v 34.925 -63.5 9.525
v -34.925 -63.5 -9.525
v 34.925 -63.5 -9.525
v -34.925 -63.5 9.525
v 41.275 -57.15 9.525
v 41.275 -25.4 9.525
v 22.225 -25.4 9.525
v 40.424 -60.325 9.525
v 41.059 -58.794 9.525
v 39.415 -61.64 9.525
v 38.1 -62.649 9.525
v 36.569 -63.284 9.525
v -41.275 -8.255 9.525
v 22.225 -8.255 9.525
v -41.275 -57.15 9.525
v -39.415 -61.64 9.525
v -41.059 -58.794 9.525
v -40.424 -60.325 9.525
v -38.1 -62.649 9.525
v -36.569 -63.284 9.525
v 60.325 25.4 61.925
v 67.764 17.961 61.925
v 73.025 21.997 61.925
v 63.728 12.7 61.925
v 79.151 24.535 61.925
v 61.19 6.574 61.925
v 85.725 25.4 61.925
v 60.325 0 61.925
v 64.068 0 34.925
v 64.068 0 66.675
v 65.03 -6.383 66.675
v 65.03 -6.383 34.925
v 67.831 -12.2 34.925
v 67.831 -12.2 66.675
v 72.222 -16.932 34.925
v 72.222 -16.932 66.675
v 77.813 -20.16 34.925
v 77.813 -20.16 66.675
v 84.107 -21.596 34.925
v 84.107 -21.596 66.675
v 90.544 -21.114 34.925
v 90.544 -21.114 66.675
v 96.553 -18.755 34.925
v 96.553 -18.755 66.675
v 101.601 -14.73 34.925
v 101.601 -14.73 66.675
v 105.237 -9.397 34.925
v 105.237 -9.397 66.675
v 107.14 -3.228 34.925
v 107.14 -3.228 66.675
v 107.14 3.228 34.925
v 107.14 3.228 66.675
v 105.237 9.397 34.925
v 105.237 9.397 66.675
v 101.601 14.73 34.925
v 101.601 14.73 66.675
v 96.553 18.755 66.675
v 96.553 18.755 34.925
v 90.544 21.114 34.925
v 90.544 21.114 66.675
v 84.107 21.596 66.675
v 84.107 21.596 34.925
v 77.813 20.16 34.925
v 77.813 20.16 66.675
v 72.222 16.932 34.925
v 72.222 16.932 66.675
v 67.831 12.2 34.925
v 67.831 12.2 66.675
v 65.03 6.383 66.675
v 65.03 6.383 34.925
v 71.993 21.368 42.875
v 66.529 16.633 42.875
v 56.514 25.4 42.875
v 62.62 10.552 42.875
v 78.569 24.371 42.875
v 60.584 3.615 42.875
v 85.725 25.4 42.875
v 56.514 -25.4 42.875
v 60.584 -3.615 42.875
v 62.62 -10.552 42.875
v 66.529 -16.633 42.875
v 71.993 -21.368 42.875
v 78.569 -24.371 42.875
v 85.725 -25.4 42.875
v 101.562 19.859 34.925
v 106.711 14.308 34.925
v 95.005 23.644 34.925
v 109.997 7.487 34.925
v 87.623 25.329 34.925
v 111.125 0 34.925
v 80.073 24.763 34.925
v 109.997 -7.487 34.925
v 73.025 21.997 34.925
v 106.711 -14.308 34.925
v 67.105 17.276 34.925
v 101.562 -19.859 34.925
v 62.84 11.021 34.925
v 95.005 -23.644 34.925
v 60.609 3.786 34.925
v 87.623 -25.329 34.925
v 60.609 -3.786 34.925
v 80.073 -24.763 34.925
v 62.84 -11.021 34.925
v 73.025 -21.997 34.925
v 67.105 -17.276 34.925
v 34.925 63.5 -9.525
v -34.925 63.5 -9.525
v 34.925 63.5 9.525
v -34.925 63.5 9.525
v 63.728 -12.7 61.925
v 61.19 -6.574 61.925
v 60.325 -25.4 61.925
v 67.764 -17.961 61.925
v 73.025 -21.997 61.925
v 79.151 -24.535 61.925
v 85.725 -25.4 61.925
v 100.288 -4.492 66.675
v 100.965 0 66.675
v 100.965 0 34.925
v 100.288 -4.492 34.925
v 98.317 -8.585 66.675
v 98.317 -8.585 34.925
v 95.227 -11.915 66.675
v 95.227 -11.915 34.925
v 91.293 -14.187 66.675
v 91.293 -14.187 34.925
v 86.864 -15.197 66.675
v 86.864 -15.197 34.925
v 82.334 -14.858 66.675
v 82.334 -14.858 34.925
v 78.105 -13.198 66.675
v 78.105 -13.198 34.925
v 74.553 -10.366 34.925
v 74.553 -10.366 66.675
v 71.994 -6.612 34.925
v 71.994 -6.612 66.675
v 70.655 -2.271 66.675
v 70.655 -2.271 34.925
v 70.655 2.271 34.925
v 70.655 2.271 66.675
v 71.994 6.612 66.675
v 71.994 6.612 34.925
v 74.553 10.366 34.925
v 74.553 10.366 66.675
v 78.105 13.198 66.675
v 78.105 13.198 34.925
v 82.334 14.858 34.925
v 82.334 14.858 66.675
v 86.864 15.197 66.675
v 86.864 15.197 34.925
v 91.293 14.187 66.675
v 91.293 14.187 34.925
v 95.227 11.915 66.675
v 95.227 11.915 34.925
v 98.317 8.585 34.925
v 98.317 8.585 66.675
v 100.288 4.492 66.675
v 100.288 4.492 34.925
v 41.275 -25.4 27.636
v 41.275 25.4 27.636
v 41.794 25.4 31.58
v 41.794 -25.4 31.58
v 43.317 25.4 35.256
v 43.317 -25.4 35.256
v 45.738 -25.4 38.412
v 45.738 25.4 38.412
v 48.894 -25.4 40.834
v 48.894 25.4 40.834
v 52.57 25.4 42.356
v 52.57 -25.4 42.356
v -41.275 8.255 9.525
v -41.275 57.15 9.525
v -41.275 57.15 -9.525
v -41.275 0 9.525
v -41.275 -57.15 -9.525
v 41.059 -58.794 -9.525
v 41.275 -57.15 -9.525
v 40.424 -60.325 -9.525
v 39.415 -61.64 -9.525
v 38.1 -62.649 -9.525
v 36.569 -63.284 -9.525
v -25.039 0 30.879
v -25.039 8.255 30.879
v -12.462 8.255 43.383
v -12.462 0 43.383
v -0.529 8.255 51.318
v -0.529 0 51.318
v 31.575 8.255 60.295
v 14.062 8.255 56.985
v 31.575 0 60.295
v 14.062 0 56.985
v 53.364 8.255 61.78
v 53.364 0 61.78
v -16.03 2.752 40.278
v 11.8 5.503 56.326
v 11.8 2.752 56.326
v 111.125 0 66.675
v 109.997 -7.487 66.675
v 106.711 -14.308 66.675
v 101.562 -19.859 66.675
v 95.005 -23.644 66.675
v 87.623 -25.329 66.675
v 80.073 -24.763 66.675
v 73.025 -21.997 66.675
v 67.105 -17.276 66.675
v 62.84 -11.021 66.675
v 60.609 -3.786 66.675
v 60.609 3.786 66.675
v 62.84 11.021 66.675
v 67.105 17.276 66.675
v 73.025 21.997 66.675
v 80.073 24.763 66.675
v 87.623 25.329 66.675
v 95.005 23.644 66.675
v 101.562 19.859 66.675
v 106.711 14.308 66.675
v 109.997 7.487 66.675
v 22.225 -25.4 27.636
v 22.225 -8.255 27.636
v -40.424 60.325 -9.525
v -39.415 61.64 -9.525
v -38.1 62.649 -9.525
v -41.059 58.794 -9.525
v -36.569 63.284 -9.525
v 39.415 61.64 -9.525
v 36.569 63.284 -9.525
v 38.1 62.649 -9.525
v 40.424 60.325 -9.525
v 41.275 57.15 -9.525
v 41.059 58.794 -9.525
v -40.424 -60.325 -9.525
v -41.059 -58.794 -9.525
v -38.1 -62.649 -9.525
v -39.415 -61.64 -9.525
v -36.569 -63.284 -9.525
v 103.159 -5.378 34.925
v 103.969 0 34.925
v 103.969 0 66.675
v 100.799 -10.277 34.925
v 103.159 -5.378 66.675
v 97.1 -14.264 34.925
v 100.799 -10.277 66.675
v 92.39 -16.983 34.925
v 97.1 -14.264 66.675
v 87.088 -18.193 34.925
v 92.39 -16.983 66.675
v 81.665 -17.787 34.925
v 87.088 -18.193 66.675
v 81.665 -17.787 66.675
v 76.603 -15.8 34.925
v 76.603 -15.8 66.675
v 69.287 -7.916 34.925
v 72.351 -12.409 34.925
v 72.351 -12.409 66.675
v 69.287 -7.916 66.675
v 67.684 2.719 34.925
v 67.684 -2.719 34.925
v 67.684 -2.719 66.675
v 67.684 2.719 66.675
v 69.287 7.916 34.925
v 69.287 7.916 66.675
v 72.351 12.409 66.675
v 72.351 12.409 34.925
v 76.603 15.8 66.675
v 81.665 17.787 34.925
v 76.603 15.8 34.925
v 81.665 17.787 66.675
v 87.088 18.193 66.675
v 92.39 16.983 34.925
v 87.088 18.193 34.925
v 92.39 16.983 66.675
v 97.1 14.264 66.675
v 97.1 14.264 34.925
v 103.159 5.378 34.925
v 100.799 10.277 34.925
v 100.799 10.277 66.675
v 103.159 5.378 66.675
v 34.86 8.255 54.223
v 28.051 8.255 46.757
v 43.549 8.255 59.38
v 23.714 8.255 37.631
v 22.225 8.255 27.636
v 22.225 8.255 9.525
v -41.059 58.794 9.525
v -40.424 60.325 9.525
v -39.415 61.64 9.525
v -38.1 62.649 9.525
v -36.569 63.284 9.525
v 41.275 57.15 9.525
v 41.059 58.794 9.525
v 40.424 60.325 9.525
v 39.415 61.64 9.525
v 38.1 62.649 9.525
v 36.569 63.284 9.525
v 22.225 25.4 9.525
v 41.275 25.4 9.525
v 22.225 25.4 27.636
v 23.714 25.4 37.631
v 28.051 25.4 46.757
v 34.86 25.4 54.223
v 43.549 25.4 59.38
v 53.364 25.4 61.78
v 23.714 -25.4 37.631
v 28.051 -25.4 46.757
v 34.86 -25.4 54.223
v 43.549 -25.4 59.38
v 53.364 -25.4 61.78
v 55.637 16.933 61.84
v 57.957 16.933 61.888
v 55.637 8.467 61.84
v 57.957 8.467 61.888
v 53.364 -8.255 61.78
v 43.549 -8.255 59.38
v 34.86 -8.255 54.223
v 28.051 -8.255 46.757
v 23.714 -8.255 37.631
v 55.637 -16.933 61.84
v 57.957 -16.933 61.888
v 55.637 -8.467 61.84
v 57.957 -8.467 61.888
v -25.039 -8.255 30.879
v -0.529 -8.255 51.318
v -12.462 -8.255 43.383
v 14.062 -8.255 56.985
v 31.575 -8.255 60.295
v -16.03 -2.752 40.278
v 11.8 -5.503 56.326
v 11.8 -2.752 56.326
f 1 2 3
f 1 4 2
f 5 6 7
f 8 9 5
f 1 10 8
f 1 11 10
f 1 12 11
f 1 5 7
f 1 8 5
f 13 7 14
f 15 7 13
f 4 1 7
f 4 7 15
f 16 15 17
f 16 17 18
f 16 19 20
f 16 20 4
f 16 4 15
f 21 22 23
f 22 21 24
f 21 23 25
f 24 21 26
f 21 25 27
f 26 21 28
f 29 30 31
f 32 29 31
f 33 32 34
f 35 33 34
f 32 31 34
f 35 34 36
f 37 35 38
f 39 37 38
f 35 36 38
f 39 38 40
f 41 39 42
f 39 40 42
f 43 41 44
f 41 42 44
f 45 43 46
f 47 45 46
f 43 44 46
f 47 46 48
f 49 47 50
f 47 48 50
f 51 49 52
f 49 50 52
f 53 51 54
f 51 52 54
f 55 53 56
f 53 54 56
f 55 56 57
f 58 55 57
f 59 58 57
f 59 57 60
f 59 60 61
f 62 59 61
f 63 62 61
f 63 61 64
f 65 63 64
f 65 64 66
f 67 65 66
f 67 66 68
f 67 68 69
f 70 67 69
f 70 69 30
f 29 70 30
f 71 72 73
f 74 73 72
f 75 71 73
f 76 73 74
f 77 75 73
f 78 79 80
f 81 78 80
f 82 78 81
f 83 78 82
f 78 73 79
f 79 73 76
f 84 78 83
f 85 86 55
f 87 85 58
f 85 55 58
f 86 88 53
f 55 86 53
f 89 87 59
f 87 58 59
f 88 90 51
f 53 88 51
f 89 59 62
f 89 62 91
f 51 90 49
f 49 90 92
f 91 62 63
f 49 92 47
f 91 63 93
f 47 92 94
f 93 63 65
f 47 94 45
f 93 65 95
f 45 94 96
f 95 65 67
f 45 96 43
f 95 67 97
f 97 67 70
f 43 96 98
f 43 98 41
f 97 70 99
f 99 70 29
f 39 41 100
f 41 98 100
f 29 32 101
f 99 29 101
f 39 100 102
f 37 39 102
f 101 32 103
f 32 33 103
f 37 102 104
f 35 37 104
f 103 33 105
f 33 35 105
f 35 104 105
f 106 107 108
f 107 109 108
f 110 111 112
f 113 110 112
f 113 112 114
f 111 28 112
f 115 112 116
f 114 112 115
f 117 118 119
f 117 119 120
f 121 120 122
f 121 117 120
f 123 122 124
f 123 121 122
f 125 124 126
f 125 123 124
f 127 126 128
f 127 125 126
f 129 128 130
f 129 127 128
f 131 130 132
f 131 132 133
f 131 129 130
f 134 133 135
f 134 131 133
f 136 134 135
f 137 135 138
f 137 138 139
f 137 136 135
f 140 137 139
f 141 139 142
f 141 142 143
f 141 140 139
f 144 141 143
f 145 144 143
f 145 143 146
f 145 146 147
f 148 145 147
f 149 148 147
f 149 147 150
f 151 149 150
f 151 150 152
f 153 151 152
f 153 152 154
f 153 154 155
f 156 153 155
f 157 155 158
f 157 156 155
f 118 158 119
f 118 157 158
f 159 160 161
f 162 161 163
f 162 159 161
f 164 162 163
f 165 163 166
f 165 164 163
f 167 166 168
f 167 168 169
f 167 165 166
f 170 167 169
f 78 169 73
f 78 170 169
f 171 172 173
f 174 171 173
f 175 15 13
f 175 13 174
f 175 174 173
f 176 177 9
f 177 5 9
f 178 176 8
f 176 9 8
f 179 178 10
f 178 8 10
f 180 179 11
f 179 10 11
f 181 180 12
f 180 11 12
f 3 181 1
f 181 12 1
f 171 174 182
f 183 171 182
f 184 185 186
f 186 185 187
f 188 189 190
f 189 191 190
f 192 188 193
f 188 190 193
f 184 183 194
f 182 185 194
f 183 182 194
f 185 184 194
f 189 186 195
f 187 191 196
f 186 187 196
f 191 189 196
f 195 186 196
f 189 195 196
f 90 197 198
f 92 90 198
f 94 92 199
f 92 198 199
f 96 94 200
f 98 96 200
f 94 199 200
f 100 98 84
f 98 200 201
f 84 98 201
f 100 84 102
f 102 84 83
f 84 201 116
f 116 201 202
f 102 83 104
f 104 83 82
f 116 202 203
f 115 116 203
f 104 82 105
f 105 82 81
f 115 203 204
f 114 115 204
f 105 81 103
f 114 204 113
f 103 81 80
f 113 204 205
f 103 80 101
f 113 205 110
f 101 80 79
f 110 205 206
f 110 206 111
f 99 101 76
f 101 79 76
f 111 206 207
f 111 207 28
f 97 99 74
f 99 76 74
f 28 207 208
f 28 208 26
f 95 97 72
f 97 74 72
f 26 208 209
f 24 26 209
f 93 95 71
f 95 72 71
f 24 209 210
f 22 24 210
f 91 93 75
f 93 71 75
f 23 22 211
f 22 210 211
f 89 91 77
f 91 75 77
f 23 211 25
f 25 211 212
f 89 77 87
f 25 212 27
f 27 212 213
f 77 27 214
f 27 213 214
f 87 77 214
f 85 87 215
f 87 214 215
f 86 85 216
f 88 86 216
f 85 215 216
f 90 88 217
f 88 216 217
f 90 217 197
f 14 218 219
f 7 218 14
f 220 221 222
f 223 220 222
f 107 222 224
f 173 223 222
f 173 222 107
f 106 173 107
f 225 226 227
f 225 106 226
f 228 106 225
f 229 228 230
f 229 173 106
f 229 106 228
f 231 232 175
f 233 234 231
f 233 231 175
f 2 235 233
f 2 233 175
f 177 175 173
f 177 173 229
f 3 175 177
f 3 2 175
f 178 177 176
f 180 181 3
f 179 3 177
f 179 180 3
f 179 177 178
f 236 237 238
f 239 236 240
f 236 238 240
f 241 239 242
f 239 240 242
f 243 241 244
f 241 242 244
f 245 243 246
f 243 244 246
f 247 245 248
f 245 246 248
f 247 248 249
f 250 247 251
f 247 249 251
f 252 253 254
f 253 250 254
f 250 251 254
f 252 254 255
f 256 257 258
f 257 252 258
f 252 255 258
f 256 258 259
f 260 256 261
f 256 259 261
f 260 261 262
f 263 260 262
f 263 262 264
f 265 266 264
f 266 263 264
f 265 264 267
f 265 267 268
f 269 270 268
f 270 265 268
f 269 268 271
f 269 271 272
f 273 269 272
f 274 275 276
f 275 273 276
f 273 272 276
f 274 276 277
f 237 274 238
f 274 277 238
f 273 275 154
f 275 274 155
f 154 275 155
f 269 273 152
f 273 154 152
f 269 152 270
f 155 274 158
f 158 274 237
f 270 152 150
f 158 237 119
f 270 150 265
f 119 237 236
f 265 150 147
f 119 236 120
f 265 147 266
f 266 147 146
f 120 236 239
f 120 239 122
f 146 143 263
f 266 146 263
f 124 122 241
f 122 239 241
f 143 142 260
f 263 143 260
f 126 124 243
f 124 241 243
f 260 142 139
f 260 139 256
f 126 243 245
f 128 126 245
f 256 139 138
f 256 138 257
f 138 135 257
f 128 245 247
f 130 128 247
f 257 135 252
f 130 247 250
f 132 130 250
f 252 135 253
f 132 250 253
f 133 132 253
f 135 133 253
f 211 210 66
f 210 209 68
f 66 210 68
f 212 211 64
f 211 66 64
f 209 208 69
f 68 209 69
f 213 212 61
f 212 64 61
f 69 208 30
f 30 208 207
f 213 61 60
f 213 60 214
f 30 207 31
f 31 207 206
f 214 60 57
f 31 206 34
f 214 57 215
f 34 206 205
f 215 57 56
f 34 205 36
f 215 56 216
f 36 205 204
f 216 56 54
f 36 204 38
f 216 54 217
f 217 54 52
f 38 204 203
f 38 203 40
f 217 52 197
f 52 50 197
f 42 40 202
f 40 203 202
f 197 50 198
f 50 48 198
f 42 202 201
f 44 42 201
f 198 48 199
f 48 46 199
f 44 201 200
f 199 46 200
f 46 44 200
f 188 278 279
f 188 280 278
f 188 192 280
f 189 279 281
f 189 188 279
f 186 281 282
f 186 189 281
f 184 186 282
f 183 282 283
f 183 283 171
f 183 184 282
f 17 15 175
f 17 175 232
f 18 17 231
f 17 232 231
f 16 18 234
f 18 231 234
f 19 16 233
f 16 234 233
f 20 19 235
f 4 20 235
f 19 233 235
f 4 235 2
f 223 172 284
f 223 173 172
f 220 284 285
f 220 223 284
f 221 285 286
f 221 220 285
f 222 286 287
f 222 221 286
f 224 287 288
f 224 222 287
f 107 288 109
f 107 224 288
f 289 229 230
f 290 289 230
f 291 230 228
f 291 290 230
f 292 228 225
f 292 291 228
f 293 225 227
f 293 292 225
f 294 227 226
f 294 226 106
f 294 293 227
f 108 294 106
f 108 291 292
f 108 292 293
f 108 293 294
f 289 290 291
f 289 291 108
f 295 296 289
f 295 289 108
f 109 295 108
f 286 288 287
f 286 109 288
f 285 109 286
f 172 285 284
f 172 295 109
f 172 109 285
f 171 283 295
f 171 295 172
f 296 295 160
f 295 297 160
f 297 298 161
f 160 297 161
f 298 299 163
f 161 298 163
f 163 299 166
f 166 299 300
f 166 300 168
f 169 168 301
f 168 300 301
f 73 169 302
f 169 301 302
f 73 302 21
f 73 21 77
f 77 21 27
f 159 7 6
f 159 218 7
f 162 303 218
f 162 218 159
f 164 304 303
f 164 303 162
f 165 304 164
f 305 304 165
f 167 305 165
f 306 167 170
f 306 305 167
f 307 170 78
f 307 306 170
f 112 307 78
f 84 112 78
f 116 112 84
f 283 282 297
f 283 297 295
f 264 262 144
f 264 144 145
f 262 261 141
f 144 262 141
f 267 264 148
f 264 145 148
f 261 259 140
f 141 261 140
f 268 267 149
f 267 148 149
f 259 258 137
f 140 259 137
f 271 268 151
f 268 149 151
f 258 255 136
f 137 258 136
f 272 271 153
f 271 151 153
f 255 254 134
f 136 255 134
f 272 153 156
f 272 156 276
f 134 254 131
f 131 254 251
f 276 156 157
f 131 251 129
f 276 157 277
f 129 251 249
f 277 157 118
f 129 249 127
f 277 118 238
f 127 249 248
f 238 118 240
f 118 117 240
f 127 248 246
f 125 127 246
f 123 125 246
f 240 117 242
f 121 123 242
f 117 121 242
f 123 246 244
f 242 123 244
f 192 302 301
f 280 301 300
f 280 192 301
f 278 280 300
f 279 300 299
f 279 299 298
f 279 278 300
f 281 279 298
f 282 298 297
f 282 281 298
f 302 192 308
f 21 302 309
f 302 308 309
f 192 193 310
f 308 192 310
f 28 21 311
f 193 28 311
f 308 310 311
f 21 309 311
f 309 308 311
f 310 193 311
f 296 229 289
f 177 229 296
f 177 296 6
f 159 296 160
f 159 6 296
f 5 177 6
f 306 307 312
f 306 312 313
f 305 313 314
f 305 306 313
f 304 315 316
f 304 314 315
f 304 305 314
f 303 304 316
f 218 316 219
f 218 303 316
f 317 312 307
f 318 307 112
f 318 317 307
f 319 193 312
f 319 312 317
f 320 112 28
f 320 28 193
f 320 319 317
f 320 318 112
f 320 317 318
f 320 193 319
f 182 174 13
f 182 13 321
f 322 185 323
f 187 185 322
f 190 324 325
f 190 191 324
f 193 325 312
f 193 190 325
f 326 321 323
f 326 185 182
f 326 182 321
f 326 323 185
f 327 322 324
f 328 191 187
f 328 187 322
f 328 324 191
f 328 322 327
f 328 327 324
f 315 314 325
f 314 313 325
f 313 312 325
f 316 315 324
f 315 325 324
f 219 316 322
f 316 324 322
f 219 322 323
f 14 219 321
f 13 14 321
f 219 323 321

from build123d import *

# Parameters (mm, degrees)
F1_DEPTH = 63.5
F0_W     = 25.4
F0_H     = 19.05
F2_DEPTH = 25.4
F3_DEPTH = 8.255
F5_R     = 6.35
F6_W     = 15.24
F6_H     = 46.9691504169
F9_DEPTH = 50.8


with BuildPart() as f1:
    # F0 (on Front) → F1 (new body, symmetric)
    with BuildSketch(Plane.XZ):
        Polygon((-41.275, -9.525), (41.275, -9.525), (41.275, 9.525), (22.225, 9.525), (-41.275, 9.525), align=None)
    extrude(amount=F1_DEPTH, both=True)

    # F0 (on Front) → F2 (join, symmetric)
    with BuildSketch(Plane.XZ):
        with BuildLine():
            Line((22.225, 9.525), (41.275, 9.525))
            Line((41.275, 9.525), (41.275, 27.6363673073))
            ThreePointArc((41.275, 27.6363673073), (45.7383507583, 38.4118492417), (56.5138326927, 42.8752))
            Line((56.5138326927, 42.8752), (60.325, 42.8752))
            Line((60.325, 42.8752), (60.325, 61.9252))
            add(Edge.make_bspline(
                [(53.3644706979, 61.7802623173), (55.6138591424, 61.8461715682), (57.932693412, 61.8939891327), (60.325, 61.9252)],
                knots=[109.5896319185, 109.5896319185, 109.5896319185, 109.5896319185, 114.3168446032, 114.3168446032, 114.3168446032, 114.3168446032], degree=3))
            ThreePointArc((53.3644706979, 61.7802623173), (31.1789556064, 50.7419521398), (22.225, 27.6363673073))
            Line((22.225, 27.6363673073), (22.225, 9.525))
        make_face()
        with Locations((73.025, 52.4002)):
            Rectangle(F0_W, F0_H)
    extrude(amount=F2_DEPTH, both=True)

    # F0 (on Front) → F3 (join, symmetric)
    with BuildSketch(Plane.XZ):
        with BuildLine():
            add(Edge.make_bspline(
                [(-41.275, 9.525), (-13.606549455, 49.0011852819), (1.217535892, 60.2523068328), (53.3644706979, 61.7802623173)],
                knots=[0, 0, 0, 0, 109.5896319185, 109.5896319185, 109.5896319185, 109.5896319185], degree=3))
            Line((-41.275, 9.525), (22.225, 9.525))
            Line((22.225, 9.525), (22.225, 27.6363673073))
            ThreePointArc((22.225, 27.6363673073), (31.1789556064, 50.7419521398), (53.3644706979, 61.7802623173))
        make_face()
    extrude(amount=F3_DEPTH, both=True)

    # F0 (on Front) → F4 (revolve)
    with BuildSketch(Plane.XZ):
        Polygon((85.725, 66.675), (85.725, 61.9252), (85.725, 42.8752), (85.725, 34.925), (111.125, 34.925), (111.125, 66.675), align=None)
    revolve(axis=Axis((85.725, 0, 50.8), (0, 0, -1)))

    # F5
    f5_edges = [f1.edges().sort_by_distance(p)[0] for p in [
        (-41.275, -63.5, 0),
        (41.275, -63.5, 0),
        (41.275, 63.5, 0),
        (-41.275, 63.5, 0),
    ]]
    fillet(f5_edges, radius=F5_R)

    # F6 (on Front) → F7 (revolve, cut)
    with BuildSketch(Plane.XZ):
        with Locations((93.345, 58.4095752084)):
            Rectangle(F6_W, F6_H)
    revolve(axis=Axis((85.725, 0, 58.4095752084), (0, 0, -1)), mode=Mode.SUBTRACT)

    # F8 (on face) → F9 (cut)
    with BuildSketch(Plane.XY.offset(66.675)):
        with BuildLine():
            ThreePointArc((67.4806815774, 0), (85.725, 18.2443184226), (103.9693184226, 0))
            Line((103.9693184226, 0), (107.3818019288, 0))
            ThreePointArc((107.3818019288, 0), (85.725, 21.6568019288), (64.0681980712, 0))
            Line((64.0681980712, 0), (67.4806815774, 0))
        make_face()
        with BuildLine():
            Line((107.3818019288, 0), (103.9693184226, 0))
            ThreePointArc((103.9693184226, 0), (85.725, -18.2443184226), (67.4806815774, 0))
            Line((67.4806815774, 0), (64.0681980712, 0))
            ThreePointArc((64.0681980712, 0), (85.725, -21.6568019288), (107.3818019288, 0))
        make_face()
    extrude(amount=-F9_DEPTH, mode=Mode.SUBTRACT)


solid = f1.part
